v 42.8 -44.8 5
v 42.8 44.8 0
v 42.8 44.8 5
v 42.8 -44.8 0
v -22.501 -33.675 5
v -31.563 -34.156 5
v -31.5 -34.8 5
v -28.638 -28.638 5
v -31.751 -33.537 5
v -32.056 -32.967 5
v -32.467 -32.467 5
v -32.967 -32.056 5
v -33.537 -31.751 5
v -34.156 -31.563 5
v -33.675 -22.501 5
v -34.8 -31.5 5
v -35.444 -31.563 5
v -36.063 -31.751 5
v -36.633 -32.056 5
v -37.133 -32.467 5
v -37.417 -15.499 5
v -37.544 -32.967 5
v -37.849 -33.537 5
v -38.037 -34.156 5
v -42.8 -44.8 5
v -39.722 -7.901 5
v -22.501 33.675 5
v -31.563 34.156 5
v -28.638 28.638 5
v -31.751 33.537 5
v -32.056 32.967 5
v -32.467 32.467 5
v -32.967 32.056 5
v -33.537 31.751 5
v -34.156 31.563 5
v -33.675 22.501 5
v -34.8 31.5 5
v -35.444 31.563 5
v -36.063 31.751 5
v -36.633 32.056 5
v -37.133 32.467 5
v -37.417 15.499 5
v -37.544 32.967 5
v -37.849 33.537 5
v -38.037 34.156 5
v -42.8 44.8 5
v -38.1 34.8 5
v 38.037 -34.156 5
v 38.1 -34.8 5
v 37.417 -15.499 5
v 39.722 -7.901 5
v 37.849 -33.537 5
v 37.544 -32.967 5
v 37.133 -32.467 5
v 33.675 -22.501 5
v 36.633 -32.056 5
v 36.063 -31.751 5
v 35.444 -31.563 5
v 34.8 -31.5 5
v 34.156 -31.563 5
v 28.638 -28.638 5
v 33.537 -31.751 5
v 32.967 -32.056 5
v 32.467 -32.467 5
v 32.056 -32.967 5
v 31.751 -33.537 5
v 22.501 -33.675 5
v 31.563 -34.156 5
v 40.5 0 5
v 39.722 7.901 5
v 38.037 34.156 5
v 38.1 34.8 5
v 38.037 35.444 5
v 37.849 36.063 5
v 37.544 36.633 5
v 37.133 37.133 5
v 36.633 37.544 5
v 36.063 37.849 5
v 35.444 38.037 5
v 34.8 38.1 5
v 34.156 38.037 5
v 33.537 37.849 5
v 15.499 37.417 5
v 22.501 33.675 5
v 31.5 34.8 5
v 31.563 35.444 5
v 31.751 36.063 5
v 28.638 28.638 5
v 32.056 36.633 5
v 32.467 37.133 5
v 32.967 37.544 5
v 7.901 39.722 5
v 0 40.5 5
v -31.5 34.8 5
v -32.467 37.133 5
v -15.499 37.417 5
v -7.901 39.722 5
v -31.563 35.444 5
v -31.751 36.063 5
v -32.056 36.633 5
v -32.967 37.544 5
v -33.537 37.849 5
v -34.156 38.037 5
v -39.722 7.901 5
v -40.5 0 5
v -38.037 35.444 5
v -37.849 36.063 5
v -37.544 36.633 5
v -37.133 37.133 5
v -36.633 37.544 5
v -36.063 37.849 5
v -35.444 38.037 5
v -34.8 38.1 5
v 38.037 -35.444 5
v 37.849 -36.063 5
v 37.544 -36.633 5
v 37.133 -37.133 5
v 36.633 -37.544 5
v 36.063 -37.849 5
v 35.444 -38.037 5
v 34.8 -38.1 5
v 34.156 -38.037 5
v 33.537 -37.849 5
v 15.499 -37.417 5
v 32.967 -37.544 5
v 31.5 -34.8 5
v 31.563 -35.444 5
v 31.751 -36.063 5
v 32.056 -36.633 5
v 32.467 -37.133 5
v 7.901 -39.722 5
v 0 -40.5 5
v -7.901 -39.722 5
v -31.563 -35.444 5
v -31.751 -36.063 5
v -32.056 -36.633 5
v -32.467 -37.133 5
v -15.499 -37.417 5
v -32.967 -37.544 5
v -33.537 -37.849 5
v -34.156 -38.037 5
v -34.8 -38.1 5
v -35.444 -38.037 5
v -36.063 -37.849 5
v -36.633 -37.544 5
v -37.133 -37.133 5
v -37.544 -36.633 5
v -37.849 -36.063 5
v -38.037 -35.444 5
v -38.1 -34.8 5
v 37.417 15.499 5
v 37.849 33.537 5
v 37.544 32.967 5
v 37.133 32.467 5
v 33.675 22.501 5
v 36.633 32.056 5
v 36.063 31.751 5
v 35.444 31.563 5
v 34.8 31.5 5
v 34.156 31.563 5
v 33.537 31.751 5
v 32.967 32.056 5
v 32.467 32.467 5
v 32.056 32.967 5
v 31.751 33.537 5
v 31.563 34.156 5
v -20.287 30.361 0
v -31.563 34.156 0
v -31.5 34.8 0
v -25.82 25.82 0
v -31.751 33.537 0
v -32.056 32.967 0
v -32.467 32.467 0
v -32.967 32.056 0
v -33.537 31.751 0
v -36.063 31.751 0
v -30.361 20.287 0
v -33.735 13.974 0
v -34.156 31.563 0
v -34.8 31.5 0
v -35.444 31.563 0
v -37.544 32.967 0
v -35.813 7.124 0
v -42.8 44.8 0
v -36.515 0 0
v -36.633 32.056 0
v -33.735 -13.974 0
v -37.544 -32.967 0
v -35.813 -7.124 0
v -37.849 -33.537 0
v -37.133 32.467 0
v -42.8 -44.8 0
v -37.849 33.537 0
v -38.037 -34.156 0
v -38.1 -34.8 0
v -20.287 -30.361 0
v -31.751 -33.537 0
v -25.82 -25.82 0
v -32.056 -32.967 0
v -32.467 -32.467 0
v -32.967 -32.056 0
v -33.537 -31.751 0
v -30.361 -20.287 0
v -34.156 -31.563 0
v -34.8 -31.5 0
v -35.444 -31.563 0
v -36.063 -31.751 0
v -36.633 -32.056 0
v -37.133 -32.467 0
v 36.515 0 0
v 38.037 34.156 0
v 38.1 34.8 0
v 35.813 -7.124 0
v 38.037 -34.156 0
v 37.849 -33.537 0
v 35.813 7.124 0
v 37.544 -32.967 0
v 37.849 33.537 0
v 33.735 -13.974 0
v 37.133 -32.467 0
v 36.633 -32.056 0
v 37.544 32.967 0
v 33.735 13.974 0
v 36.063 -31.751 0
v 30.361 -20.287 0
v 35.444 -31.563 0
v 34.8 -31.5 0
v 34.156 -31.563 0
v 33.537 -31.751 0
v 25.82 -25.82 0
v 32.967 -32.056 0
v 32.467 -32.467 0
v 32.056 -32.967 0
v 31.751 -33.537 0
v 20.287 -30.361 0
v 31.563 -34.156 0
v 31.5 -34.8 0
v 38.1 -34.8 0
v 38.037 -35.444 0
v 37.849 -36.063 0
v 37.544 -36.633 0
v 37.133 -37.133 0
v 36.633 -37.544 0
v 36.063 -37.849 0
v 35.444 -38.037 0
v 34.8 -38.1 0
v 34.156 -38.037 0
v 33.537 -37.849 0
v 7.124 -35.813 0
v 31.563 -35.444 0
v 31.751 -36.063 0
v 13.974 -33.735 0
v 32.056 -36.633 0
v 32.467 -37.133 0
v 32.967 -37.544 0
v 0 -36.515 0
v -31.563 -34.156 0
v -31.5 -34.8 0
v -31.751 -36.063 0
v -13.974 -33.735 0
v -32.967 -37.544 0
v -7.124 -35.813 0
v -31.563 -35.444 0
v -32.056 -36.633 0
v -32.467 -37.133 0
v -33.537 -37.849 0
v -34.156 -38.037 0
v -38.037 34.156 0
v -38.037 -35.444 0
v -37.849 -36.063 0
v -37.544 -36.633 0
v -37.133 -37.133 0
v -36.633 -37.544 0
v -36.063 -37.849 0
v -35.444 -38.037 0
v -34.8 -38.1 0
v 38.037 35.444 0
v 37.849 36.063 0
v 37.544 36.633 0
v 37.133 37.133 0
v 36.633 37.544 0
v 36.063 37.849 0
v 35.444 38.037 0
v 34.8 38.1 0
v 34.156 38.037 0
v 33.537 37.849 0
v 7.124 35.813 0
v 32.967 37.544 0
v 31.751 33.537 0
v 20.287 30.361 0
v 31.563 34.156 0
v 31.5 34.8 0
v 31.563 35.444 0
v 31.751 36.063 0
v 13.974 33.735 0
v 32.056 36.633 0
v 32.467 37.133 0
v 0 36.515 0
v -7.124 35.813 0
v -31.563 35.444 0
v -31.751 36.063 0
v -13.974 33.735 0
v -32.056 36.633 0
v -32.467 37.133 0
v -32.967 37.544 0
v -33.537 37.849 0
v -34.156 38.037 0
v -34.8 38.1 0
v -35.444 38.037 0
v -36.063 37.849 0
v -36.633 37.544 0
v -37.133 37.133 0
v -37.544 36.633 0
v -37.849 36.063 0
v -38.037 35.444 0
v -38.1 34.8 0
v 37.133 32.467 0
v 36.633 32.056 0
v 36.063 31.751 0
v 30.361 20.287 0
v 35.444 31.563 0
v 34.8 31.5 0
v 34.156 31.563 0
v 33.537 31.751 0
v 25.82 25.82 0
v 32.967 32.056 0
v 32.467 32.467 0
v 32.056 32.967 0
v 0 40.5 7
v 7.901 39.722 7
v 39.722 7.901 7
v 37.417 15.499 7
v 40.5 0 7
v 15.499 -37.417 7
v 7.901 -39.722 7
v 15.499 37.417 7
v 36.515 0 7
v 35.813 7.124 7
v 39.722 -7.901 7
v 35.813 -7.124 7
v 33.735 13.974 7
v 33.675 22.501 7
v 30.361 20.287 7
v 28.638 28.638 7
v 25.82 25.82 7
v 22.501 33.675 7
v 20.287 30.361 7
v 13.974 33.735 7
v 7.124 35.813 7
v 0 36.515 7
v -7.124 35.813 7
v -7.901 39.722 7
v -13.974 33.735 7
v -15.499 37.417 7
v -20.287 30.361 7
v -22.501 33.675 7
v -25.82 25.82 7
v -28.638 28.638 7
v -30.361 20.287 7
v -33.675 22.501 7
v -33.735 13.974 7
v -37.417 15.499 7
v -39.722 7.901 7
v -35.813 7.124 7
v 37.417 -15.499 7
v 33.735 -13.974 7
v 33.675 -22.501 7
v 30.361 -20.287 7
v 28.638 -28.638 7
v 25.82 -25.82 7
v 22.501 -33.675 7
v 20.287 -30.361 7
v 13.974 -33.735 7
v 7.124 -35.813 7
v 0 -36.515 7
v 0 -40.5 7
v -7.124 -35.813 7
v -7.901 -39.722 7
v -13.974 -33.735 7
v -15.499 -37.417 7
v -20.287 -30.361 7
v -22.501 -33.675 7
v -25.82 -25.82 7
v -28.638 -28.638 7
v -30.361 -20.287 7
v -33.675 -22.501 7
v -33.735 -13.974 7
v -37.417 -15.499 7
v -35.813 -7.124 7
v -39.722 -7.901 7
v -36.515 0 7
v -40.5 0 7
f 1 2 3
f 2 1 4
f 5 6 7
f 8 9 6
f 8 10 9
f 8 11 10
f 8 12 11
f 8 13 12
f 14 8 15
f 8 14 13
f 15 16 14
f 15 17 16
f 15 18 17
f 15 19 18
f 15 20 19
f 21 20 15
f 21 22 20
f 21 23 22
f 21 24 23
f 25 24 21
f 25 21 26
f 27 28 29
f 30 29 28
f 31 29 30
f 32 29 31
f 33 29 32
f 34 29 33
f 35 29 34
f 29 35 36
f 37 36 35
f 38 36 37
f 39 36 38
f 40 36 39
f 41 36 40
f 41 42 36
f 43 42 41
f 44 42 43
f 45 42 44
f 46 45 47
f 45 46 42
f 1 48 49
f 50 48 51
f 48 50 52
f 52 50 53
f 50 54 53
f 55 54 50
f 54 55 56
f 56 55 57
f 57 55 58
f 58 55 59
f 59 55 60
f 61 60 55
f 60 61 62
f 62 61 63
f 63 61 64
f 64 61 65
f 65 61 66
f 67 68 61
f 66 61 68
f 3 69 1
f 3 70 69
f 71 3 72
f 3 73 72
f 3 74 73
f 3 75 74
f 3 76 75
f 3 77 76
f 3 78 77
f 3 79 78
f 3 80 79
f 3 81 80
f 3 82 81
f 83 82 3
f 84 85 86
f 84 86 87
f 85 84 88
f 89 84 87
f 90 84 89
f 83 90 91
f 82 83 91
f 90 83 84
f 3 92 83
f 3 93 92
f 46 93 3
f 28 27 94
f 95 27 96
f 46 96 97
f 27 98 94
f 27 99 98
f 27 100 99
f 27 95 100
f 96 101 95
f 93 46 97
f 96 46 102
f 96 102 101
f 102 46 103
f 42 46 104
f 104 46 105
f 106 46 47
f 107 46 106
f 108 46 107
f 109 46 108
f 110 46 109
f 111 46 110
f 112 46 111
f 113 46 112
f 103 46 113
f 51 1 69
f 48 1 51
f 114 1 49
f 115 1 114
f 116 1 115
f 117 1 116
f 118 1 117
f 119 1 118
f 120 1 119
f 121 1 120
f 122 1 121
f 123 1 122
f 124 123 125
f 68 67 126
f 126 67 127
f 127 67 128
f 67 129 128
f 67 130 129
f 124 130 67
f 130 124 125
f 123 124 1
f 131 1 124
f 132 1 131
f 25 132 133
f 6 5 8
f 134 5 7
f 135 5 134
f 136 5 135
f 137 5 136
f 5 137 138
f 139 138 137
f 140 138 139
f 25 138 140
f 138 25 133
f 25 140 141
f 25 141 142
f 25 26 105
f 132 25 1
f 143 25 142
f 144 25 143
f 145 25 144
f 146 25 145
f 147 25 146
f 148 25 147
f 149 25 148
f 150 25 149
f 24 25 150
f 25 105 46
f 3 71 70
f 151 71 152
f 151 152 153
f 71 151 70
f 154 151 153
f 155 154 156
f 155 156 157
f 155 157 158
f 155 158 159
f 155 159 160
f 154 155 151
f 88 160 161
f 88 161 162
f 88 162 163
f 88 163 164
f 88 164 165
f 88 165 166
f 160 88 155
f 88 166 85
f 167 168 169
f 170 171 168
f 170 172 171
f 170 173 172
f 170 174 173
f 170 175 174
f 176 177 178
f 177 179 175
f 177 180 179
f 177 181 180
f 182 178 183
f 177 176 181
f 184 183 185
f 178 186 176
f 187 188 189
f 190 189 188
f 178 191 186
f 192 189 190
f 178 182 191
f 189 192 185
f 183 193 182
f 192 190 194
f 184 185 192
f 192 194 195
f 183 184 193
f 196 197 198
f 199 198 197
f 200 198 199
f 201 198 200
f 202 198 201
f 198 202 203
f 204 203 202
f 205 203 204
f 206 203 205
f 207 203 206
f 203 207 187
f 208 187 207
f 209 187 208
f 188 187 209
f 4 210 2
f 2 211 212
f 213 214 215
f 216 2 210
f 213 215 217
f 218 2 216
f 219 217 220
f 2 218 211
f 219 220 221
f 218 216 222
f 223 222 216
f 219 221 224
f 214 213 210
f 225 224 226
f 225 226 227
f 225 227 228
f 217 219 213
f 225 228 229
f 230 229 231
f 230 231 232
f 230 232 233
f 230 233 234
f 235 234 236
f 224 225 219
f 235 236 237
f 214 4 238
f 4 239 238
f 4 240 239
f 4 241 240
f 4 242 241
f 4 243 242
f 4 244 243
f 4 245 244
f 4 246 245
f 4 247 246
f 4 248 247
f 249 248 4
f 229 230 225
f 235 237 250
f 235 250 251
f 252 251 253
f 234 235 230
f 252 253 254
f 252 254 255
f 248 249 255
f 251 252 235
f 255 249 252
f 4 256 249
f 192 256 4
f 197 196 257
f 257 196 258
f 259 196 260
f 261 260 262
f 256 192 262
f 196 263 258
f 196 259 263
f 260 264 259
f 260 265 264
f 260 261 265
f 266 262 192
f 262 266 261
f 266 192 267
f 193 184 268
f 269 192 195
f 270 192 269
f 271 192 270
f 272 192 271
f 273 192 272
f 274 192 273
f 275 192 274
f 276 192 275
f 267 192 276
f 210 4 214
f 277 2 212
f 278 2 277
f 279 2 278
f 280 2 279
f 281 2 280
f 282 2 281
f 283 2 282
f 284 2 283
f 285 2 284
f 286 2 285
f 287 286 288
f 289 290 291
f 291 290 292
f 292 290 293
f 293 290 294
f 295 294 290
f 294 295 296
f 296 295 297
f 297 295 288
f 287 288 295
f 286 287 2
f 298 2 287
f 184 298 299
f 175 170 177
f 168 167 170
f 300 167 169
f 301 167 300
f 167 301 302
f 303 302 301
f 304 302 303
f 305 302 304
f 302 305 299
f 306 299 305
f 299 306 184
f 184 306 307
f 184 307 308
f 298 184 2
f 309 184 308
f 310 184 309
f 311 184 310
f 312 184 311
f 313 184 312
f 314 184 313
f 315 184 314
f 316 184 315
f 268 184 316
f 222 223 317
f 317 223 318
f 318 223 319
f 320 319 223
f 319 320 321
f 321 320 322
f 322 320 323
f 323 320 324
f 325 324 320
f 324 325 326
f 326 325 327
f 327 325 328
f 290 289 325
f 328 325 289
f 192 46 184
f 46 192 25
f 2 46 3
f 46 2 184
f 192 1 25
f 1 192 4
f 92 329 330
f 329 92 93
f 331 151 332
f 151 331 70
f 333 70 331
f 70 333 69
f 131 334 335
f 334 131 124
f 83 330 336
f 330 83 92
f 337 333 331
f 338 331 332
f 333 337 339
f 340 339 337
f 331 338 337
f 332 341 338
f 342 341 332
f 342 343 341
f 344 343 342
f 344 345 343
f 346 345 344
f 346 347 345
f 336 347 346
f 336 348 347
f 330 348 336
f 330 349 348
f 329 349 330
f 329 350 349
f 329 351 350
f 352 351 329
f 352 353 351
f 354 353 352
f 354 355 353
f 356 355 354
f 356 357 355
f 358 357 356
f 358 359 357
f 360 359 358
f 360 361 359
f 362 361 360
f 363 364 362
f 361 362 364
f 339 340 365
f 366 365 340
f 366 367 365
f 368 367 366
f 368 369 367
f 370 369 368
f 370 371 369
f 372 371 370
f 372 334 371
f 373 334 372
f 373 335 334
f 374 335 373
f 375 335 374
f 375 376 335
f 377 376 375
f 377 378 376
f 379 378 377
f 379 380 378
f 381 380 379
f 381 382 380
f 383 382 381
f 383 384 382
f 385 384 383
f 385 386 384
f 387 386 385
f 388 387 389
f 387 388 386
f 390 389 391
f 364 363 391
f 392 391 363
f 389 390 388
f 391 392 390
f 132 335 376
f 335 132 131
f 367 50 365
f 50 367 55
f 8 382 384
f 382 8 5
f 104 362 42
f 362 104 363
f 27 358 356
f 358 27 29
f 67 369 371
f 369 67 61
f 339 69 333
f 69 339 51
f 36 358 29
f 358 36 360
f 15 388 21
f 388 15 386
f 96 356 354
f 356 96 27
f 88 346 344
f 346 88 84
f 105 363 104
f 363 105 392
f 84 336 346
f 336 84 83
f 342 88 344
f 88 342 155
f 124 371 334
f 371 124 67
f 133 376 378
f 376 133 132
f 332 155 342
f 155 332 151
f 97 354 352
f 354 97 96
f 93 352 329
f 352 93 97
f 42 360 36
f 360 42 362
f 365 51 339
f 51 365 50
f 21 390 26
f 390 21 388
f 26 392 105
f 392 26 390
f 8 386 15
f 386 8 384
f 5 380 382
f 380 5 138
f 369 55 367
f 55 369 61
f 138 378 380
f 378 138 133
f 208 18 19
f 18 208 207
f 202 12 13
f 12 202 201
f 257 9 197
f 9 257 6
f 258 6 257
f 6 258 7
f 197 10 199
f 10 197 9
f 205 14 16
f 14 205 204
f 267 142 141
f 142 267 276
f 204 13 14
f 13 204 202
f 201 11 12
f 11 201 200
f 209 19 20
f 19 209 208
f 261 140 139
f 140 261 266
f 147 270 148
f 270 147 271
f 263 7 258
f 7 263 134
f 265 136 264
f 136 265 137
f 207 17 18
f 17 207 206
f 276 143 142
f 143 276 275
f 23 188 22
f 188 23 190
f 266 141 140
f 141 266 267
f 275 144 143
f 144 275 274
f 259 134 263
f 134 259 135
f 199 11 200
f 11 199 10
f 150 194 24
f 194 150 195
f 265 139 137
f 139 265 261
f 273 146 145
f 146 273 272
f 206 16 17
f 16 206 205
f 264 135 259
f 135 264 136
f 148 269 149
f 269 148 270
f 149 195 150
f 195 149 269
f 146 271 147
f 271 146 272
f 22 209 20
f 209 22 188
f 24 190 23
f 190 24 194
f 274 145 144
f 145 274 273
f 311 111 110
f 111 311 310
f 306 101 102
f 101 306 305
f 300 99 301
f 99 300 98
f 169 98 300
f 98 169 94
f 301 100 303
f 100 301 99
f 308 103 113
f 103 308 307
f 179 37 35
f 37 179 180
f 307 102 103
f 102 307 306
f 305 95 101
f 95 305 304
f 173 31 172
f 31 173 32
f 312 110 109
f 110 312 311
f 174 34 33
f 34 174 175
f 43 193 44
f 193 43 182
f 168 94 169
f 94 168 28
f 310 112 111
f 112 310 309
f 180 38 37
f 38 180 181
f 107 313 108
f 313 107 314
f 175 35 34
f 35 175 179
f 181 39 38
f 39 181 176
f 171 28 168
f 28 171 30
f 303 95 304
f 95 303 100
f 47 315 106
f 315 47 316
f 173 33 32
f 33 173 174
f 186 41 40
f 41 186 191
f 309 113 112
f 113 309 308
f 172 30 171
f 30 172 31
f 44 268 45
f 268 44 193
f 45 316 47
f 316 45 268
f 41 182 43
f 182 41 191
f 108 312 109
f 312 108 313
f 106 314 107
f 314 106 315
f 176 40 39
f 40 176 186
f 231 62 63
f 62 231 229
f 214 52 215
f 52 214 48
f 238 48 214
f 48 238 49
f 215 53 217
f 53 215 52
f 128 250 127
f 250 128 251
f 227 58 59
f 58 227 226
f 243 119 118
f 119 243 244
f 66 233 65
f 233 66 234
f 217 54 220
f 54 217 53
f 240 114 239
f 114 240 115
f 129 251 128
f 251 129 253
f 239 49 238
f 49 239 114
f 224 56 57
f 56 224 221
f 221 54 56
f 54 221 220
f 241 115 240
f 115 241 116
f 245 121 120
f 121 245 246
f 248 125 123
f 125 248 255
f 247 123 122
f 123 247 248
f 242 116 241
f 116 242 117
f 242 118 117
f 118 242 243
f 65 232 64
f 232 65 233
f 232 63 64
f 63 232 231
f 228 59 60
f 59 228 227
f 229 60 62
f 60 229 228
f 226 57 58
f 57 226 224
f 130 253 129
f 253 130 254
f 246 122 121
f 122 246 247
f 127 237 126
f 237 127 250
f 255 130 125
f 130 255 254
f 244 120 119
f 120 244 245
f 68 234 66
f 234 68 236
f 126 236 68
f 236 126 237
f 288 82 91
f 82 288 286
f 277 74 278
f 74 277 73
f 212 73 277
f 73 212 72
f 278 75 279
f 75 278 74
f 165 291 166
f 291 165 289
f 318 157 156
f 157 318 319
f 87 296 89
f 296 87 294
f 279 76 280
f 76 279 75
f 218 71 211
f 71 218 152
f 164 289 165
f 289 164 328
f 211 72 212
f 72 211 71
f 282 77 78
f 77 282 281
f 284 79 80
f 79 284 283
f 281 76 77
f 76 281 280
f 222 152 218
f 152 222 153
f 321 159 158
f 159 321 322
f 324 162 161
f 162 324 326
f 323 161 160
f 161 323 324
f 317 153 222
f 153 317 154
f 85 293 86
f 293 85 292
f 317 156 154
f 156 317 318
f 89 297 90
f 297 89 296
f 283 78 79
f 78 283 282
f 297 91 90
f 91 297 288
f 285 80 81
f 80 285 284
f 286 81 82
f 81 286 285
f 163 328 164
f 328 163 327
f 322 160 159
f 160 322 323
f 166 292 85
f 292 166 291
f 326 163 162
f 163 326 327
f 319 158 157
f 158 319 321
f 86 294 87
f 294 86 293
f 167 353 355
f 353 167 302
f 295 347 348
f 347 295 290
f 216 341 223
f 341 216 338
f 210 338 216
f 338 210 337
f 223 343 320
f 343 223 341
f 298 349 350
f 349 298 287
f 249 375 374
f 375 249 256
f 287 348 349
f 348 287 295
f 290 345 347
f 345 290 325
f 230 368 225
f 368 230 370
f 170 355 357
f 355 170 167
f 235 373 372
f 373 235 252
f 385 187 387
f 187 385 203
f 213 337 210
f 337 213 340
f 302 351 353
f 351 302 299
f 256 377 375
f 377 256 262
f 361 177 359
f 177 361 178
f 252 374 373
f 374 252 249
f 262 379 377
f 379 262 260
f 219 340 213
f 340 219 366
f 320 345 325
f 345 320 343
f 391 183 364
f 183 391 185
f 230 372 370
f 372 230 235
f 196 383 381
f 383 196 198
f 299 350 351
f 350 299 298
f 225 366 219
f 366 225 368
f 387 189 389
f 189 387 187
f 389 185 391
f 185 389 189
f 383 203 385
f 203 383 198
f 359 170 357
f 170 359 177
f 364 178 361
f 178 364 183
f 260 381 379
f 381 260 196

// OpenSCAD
$fn = 32;

// ----------------------------------------------------------------------
// Motor mount plate: NEMA34, 85.6 x 89.6 x 7 mm
// ----------------------------------------------------------------------

// --- parameters (mm) ---
plate_w = 85.6;           // plate length, X
plate_d = 89.6;           // plate width, Y
plate_t = 5;              // plate thickness
pattern = 69.6;           // NEMA34 bolt spacing
motor_d = 6.6;            // NEMA34 screw clearance
pilot_d = 73.03;          // pilot boss bore
boss_d = 81;              // raised pilot ring
boss_h = 2;               // raised pilot ring height

module plate() {
  translate([-plate_w / 2, -plate_d / 2, 0]) cube([plate_w, plate_d, plate_t]);
}

module motor_holes() {
  for (sx = [-1, 1]) for (sy = [-1, 1])
    translate([sx * pattern / 2, sy * pattern / 2, -1])
      cylinder(h = plate_t + 2, d = motor_d);
}
module pilot_ring() {
  translate([0, 0, plate_t - 1]) cylinder(h = boss_h + 1, d = boss_d);
}

difference() {
  union() {
    plate();
    pilot_ring();
  }
  motor_holes();
  translate([0, 0, -1]) cylinder(h = plate_t + boss_h + 2, d = pilot_d);
}
